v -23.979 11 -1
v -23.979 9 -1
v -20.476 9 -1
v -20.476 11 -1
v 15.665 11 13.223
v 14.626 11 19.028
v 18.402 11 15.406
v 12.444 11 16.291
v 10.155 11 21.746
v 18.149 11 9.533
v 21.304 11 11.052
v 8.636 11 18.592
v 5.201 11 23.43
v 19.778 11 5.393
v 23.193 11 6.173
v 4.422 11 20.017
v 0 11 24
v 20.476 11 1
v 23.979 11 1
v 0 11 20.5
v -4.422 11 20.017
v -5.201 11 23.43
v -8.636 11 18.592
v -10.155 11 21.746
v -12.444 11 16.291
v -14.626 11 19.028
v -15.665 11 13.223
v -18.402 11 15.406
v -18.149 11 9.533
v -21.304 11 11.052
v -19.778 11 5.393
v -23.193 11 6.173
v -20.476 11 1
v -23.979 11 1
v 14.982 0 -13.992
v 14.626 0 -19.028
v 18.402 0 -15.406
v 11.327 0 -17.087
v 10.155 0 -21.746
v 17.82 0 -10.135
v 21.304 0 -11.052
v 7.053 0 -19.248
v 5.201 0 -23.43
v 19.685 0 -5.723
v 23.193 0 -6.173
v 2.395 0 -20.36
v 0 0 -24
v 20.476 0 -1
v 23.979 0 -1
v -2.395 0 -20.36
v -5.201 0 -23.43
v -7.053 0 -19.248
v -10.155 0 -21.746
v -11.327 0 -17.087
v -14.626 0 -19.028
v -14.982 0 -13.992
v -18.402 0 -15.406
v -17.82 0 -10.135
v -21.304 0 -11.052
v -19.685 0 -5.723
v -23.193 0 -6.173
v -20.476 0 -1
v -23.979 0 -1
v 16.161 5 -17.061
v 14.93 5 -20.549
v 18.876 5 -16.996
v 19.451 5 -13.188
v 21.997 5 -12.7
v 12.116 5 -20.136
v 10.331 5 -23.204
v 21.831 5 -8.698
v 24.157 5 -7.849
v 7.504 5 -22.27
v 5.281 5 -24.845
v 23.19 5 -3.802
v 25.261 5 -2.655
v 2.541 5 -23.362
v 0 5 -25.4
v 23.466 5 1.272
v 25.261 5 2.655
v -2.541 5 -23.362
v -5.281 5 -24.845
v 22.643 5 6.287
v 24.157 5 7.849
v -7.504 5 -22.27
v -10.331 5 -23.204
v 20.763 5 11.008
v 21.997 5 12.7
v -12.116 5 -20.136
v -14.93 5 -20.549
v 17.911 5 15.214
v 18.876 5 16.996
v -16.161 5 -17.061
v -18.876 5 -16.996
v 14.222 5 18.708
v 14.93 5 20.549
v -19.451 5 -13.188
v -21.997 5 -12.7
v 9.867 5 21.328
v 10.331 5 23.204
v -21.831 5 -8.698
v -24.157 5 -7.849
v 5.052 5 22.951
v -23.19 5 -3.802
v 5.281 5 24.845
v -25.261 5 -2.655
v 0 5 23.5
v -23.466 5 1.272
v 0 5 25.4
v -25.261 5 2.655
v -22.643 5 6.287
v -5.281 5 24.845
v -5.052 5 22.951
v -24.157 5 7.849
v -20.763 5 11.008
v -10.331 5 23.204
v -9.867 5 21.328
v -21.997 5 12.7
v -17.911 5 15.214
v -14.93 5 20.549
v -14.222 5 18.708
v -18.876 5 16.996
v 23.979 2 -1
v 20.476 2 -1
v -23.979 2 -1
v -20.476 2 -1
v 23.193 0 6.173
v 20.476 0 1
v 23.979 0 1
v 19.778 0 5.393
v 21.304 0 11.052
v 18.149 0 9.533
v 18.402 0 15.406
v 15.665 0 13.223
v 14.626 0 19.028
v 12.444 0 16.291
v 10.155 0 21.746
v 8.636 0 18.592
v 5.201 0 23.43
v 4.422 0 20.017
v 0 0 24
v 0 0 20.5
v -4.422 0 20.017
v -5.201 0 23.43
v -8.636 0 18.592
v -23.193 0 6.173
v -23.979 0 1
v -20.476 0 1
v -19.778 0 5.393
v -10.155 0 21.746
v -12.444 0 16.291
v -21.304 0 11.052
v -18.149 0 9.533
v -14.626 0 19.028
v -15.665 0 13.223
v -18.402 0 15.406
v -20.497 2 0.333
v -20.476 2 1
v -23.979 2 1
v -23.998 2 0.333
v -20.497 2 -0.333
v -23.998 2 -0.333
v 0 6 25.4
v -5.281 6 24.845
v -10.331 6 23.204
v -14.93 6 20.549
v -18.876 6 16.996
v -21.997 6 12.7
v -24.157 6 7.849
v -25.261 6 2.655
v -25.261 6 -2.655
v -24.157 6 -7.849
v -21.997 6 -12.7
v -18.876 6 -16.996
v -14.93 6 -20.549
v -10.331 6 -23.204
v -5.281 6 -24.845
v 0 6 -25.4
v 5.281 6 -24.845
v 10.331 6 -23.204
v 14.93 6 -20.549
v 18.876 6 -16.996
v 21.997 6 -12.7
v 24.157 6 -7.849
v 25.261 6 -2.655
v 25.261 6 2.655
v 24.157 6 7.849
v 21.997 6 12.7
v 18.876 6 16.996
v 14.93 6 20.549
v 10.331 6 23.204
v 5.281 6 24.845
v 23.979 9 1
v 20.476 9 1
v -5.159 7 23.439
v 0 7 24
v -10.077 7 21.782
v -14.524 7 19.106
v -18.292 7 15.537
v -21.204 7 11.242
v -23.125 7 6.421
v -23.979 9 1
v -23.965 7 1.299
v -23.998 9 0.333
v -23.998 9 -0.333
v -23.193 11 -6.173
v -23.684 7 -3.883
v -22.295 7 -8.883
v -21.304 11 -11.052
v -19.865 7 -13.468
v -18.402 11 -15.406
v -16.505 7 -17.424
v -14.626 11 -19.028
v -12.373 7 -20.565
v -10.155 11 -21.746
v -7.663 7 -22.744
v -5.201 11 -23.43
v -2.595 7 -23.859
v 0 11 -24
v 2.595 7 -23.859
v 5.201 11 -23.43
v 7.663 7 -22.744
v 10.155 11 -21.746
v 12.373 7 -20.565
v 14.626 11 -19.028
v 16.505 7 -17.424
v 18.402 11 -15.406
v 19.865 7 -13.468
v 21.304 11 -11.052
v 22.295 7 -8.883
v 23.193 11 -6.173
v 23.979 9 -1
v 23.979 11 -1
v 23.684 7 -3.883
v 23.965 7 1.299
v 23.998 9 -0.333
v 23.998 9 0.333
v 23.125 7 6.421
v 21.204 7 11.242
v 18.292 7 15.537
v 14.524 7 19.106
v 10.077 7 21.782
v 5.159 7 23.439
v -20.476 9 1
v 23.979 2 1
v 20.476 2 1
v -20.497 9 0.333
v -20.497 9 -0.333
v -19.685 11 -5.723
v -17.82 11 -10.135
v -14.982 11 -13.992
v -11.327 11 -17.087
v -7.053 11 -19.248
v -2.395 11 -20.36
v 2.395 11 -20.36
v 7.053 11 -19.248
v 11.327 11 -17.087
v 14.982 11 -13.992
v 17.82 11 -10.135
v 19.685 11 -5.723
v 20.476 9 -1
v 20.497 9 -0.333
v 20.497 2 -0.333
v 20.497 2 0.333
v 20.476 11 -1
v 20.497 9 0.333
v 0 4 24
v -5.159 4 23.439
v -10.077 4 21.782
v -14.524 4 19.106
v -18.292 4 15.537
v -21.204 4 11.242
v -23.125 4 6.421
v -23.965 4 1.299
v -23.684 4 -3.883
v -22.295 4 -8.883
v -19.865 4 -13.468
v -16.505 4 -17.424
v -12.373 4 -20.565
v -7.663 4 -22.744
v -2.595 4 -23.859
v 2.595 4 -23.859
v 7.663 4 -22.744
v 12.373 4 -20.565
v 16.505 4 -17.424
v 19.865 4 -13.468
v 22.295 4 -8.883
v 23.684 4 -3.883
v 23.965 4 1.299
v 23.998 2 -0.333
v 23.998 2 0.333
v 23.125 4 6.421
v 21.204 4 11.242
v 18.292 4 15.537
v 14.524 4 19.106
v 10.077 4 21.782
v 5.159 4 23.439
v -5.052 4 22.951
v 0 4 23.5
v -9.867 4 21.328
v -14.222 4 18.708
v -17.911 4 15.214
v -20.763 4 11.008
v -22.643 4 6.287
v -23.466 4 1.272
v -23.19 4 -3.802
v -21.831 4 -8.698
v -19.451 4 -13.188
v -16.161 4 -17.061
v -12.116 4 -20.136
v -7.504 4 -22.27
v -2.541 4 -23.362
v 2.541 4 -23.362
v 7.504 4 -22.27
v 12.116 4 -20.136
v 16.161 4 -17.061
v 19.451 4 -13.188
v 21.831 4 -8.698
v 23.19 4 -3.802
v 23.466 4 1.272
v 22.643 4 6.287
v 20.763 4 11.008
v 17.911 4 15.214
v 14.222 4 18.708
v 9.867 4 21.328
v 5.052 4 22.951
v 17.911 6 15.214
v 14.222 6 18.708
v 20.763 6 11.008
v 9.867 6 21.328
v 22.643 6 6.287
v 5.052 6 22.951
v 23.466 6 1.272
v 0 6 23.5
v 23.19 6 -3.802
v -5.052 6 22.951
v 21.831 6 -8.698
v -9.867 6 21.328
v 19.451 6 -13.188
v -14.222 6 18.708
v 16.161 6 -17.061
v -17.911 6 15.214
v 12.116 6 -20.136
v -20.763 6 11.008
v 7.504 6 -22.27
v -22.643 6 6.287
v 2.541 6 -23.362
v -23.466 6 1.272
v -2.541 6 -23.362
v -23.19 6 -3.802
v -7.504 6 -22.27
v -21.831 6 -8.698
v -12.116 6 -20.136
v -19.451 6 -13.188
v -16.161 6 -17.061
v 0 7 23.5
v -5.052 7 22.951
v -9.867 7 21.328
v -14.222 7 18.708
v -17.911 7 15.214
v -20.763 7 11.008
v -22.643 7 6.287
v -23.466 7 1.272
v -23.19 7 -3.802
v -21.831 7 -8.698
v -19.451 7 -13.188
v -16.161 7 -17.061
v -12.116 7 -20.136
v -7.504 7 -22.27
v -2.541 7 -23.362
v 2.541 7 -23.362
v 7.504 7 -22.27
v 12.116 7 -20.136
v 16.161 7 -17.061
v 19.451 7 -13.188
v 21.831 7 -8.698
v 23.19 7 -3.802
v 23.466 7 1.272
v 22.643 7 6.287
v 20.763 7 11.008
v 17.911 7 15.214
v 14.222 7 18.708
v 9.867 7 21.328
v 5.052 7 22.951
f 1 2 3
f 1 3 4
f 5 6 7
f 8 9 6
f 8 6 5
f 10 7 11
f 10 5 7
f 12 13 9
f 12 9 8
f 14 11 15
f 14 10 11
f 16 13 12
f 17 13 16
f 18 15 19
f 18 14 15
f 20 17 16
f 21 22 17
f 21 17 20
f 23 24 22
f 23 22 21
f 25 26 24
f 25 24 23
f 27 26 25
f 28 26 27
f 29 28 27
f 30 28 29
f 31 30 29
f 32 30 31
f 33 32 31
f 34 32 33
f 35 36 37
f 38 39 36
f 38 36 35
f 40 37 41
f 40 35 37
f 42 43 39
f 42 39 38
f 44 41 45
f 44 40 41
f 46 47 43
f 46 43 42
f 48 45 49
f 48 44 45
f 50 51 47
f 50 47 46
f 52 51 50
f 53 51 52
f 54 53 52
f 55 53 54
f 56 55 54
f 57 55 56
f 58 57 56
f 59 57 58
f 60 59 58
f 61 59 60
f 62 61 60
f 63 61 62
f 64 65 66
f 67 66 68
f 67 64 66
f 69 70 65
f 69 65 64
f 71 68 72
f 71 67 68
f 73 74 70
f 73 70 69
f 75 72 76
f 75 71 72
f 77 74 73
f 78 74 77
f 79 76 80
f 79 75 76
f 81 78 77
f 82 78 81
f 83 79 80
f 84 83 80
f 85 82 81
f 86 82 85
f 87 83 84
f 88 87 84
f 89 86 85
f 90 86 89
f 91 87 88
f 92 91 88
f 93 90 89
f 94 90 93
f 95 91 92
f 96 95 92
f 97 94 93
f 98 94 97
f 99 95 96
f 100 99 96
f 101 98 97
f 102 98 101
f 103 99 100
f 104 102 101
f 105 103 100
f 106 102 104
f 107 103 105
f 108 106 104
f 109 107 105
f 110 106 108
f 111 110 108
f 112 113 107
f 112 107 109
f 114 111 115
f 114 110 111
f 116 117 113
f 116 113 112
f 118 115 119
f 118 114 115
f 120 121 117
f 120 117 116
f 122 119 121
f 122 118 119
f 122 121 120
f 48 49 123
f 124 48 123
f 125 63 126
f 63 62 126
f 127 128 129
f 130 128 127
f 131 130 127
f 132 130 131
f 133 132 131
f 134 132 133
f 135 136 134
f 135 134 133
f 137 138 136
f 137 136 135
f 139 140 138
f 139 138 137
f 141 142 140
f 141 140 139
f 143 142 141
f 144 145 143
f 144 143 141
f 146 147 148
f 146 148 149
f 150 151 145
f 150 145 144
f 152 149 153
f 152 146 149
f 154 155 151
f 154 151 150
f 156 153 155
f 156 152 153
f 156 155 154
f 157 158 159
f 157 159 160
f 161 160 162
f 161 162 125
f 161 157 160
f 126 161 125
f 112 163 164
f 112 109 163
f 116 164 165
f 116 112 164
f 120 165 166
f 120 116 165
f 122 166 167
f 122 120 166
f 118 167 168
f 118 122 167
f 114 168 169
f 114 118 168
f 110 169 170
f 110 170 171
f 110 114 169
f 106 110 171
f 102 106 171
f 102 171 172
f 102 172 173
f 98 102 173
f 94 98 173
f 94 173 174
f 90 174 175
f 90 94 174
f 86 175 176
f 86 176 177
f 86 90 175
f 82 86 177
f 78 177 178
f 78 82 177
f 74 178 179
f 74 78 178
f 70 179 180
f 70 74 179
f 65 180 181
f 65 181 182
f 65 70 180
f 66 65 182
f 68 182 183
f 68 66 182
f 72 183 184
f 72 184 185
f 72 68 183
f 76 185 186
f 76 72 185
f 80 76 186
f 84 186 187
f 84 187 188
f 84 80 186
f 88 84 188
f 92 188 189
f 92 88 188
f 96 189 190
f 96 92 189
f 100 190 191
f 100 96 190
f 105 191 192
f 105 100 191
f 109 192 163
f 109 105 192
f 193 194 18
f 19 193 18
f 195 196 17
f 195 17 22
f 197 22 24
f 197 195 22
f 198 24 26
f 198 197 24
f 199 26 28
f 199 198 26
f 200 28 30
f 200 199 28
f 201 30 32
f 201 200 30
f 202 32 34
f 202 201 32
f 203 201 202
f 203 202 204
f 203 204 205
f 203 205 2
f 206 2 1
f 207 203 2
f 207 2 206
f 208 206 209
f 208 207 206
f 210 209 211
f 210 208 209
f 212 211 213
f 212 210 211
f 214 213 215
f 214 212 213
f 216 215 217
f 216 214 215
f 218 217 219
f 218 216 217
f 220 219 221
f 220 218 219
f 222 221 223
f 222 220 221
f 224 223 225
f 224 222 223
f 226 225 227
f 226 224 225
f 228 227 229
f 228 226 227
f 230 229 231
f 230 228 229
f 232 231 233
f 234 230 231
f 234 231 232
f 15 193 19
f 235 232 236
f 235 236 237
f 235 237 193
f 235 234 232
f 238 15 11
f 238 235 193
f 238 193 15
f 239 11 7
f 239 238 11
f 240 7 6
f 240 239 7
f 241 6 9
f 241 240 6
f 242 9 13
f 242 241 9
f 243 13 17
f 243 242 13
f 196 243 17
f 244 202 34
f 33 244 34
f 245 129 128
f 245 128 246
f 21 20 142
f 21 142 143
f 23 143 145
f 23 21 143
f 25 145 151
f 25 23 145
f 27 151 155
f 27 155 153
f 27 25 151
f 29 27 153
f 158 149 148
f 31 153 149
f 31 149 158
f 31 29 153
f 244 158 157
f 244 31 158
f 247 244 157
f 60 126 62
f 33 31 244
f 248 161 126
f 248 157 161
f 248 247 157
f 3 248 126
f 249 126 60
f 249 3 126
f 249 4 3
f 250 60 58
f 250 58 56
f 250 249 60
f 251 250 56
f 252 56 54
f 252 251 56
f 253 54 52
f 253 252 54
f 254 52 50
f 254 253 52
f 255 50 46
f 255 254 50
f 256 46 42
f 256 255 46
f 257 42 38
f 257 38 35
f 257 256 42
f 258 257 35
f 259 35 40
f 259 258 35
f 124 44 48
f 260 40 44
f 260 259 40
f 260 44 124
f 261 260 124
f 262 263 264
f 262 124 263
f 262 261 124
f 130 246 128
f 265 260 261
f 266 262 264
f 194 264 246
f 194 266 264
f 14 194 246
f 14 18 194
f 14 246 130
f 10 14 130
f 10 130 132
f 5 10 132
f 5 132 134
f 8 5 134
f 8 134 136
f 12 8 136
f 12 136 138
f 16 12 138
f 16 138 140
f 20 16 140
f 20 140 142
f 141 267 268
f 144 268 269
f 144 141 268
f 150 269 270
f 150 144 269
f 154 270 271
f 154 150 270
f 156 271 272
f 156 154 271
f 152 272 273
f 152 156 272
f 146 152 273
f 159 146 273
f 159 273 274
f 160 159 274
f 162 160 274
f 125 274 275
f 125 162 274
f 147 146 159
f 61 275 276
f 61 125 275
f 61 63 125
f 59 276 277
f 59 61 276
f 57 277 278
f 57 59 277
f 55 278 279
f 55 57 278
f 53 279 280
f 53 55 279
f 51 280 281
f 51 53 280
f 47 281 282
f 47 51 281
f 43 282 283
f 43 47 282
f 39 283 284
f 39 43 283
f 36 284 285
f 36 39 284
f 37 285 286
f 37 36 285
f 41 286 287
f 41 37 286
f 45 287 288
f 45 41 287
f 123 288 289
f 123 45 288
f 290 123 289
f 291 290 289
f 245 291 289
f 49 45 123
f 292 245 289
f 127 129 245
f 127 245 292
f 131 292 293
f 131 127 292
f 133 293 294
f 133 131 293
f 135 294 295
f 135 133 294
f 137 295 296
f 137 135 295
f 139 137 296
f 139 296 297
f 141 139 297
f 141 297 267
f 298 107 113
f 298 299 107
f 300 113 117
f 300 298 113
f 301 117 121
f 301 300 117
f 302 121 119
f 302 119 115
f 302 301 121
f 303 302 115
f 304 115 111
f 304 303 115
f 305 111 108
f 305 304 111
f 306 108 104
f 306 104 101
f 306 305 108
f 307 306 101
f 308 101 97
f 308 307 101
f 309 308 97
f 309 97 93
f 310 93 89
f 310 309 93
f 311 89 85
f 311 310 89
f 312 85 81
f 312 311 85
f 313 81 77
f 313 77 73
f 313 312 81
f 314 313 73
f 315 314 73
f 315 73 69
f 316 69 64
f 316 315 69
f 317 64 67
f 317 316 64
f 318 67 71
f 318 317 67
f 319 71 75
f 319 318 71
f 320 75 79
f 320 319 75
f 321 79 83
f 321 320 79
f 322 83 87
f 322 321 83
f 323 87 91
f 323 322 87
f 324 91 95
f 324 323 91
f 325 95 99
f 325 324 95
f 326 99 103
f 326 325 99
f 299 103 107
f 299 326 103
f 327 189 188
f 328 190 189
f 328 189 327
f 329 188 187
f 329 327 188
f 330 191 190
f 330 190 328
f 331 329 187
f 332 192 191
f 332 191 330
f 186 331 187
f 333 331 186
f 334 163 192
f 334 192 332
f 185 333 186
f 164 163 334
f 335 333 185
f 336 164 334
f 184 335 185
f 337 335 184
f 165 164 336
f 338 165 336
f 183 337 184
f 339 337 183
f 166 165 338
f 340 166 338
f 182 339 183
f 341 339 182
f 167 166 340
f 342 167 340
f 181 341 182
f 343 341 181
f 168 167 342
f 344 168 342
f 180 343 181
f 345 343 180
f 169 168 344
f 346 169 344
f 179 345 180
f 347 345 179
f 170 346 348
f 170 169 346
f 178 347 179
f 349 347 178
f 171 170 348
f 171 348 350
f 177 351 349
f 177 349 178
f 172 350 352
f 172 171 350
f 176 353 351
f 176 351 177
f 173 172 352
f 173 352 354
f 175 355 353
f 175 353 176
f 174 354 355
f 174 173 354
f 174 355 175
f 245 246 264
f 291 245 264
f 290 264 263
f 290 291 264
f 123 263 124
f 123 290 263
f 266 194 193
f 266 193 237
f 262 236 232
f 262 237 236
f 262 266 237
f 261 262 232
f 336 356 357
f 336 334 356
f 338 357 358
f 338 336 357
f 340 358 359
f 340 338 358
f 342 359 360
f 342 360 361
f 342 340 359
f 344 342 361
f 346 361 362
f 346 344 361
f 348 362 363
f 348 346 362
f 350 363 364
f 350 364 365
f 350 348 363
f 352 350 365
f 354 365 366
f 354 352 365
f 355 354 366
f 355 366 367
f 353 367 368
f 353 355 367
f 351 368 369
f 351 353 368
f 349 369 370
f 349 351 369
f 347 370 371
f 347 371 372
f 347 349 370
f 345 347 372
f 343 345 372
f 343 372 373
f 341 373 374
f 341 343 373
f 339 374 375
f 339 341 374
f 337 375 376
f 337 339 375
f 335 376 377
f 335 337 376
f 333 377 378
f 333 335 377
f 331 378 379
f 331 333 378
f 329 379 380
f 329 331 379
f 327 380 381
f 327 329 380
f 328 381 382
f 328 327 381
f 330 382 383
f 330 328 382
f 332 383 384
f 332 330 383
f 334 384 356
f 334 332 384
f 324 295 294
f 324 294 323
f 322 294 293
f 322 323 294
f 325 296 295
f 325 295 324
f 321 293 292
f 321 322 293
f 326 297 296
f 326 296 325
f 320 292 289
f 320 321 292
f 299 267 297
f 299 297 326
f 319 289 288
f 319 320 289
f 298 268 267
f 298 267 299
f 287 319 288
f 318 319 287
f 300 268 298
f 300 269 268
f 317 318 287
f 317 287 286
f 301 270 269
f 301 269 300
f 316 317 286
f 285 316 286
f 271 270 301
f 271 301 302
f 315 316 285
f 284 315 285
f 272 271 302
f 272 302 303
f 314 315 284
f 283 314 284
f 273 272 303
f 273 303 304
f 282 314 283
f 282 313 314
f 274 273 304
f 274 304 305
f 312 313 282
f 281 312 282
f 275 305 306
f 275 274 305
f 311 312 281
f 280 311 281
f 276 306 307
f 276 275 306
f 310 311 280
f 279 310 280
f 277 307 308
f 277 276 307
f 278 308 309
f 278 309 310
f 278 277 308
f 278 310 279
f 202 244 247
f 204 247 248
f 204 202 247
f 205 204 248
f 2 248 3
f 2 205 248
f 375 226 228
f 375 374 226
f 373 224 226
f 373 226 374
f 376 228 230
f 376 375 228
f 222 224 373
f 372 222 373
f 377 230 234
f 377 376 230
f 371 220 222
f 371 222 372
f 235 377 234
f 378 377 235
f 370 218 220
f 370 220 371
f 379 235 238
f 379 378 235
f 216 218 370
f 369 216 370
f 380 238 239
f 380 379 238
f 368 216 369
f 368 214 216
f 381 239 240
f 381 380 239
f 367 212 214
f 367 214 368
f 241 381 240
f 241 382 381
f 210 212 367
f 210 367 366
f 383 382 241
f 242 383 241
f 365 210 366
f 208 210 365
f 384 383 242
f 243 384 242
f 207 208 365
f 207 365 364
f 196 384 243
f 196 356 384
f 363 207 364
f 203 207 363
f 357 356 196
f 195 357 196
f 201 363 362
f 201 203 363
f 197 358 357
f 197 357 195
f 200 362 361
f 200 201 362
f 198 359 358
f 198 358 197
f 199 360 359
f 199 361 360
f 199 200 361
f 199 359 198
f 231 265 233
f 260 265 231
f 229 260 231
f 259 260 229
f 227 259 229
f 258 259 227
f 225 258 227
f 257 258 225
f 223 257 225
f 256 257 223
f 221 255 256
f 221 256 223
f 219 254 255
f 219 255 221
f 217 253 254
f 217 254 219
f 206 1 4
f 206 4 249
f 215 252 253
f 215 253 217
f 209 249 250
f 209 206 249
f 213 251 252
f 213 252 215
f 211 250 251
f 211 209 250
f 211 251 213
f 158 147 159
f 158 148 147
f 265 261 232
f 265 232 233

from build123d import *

# Parameters (mm, degrees)
SKETCH_2_W          = 2
SKETCH_2_H          = 4.593987872
SKETCH_2_H_2        = 6.667892238
CUT_EXTRUDE_1_DEPTH = 39.5


with BuildPart() as part:
    # 草图1 → 旋转1 (revolve)
    with BuildSketch(Plane.XY, mode=Mode.PRIVATE) as revolve_1_sk:
        Polygon((-20.5, 11), (-24, 11), (-24, 7), (-23.5, 7), (-23.5, 6), (-25.4, 6), (-25.4, 5), (-23.5, 5), (-23.5, 4), (-24, 4), (-24, 0), (-20.5, 0), align=None)
    revolve(revolve_1_sk.sketch.rotate(Axis((0, 22.677499451, 0), (0, -1, 0)), 270), axis=Axis((0, 22.677499451, 0), (0, -1, 0)))  # turned: the seam where the file's is

    # 草图2 → 切除-拉伸1 (cut, symmetric)
    with BuildSketch(Plane(origin=(0, 0, 0), x_dir=(0, 0, -1), z_dir=(1, 0, 0))):
        with Locations((0, 11.296993936)):
            Rectangle(SKETCH_2_W, SKETCH_2_H)
        with Locations((0, -1.333946119)):
            Rectangle(SKETCH_2_W, SKETCH_2_H_2)
    extrude(amount=CUT_EXTRUDE_1_DEPTH, both=True, mode=Mode.SUBTRACT)


solid = part.part
